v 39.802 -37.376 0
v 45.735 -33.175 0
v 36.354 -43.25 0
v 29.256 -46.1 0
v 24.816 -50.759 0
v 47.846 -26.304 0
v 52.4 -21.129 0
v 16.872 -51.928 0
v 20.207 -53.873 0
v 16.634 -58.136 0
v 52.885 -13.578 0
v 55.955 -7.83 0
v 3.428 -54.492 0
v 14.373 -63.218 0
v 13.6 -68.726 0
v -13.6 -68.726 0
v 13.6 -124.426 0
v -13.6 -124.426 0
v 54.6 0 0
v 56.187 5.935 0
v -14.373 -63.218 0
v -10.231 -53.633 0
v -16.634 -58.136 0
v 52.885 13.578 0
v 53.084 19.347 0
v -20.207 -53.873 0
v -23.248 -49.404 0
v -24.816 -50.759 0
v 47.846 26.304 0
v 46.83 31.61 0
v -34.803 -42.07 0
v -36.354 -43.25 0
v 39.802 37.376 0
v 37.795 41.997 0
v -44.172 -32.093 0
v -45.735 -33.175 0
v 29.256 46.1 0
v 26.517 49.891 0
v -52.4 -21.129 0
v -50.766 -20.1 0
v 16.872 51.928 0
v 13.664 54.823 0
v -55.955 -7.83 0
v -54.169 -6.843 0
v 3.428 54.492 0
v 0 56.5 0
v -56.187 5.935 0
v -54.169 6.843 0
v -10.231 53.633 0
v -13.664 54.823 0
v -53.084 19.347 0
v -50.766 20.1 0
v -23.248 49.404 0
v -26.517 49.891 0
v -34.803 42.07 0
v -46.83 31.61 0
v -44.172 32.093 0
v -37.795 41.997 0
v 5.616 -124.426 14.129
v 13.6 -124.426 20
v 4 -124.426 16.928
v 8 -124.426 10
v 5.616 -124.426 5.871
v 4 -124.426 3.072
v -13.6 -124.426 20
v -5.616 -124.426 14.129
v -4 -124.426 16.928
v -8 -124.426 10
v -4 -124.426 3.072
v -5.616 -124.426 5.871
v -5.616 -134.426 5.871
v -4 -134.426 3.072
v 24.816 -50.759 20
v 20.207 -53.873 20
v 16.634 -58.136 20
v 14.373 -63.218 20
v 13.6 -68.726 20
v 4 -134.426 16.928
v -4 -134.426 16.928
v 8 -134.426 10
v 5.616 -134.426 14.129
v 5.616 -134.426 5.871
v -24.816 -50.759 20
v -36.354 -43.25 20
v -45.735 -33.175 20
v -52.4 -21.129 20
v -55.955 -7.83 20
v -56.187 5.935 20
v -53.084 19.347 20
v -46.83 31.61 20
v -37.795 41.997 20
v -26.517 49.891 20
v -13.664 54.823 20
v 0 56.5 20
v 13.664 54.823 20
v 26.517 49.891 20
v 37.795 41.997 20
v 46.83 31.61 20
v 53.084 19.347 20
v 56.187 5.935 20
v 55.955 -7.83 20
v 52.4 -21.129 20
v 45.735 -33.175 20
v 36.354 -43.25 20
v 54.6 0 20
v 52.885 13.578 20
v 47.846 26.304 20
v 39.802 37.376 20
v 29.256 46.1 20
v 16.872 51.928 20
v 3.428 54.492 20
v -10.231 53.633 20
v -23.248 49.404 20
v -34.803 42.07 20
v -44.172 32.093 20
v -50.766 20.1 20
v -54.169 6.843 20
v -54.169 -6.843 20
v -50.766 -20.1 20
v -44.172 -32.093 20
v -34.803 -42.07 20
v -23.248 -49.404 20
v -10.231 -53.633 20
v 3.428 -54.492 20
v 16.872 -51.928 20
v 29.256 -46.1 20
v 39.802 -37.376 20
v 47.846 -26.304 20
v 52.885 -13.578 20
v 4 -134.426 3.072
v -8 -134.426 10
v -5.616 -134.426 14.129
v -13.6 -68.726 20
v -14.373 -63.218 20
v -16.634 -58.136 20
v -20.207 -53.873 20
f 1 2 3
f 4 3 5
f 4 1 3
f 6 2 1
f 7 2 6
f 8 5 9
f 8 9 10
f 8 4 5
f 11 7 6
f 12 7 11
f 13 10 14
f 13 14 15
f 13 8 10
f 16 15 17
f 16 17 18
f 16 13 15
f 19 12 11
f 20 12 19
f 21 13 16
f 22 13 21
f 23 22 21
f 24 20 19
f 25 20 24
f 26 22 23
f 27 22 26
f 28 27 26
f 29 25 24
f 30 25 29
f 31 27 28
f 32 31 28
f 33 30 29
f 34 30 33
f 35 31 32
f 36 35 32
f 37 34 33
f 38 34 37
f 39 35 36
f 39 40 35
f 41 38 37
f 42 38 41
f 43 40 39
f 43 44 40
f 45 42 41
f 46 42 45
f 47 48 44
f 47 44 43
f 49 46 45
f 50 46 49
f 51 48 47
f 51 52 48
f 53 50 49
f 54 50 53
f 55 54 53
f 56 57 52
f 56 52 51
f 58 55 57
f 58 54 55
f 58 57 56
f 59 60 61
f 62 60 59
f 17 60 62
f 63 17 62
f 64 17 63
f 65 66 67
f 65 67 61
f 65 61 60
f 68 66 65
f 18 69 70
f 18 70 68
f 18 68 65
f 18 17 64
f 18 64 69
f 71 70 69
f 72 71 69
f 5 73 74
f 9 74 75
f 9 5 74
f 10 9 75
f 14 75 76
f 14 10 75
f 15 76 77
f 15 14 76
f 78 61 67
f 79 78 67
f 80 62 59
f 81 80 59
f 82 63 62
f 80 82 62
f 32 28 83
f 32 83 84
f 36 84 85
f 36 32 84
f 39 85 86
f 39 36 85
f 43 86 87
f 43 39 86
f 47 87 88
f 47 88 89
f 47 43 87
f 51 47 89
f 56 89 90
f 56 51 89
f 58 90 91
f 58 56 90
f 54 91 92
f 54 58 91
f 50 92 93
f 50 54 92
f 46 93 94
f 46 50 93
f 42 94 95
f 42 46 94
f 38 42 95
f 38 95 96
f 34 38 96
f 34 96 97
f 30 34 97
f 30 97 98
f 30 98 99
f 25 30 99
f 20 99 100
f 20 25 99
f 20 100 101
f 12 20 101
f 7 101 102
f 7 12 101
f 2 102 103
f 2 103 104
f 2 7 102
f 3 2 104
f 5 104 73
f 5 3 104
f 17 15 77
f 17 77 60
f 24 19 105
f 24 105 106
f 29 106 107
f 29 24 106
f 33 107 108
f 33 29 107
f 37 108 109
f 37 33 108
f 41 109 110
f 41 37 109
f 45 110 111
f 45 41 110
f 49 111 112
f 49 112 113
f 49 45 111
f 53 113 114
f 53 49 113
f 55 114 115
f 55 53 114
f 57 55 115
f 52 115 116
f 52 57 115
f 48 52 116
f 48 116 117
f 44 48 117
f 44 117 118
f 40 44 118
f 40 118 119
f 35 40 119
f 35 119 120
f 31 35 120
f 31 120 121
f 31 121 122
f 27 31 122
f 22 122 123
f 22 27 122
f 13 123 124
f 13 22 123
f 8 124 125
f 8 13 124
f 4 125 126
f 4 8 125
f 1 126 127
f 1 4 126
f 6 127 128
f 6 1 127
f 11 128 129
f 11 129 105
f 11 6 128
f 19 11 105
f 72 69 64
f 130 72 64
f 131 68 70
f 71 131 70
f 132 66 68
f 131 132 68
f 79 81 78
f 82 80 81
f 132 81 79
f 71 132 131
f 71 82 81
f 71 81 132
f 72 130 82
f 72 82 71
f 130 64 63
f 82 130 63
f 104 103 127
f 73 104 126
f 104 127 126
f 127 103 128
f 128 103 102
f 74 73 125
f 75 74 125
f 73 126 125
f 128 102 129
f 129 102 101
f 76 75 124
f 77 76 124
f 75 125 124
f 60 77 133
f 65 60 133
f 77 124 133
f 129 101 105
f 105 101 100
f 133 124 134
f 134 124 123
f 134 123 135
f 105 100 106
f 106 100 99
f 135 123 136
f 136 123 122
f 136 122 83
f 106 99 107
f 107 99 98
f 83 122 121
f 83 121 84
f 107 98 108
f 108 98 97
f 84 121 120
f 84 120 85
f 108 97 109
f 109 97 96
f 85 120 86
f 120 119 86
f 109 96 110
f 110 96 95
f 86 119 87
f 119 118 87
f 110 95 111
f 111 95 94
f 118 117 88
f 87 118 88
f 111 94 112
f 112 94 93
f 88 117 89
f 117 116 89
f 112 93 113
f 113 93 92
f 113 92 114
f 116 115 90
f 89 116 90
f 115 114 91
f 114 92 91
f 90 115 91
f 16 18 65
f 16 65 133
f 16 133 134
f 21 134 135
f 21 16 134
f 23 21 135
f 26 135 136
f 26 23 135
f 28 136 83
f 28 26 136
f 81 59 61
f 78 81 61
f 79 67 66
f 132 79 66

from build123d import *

# Parameters (mm, degrees)
SKETCH1_R           = 54.6
BOSS_EXTRUDE1_DEPTH = 20
BOSS_EXTRUDE2_DEPTH = 10


with BuildPart() as part:
    # Sketch1 → Boss-Extrude1 (new body)
    with BuildSketch(Plane.XY):
        with BuildLine():
            ThreePointArc((24.815698382, -50.75855705), (16.634074625, -58.135776168), (13.600016394, -68.726187864))
            Line((13.600016394, -68.726187864), (13.600016394, -124.425859017))
            Line((13.600016394, -124.425859017), (-13.600016394, -124.425859017))
            Line((-13.600016394, -124.425859017), (-13.600016394, -68.726187864))
            ThreePointArc((-13.600016394, -68.726187864), (-16.634074625, -58.135776168), (-24.815698382, -50.75855705))
            ThreePointArc((-24.815698382, -50.75855705), (0, 56.5), (24.815698382, -50.75855705))
        make_face()
        Circle(SKETCH1_R, mode=Mode.SUBTRACT)
    extrude(amount=BOSS_EXTRUDE1_DEPTH)

    # Sketch3 → Boss-Extrude2 (add)
    with BuildSketch(Plane(origin=(0, -124.425859017, 0), x_dir=(-1, 0, 0), z_dir=(0, -1, 0))):
        Polygon((4, -16.92820323), (5.615919889, -14.129347882), (0, -10), (-5.615919889, -14.129347882), (-4, -16.92820323), align=None)
        Polygon((-5.615919889, -14.129347882), (0, -10), (-5.615919889, -5.870652118), (-8, -10), align=None)
        Polygon((-5.615919889, -5.870652118), (0, -10), (5.615919889, -5.870652118), (4, -3.07179677), (-4, -3.07179677), align=None)
        Polygon((0, -10), (5.615919889, -14.129347882), (8, -10), (5.615919889, -5.870652118), align=None)
    extrude(amount=BOSS_EXTRUDE2_DEPTH)


solid = part.part
